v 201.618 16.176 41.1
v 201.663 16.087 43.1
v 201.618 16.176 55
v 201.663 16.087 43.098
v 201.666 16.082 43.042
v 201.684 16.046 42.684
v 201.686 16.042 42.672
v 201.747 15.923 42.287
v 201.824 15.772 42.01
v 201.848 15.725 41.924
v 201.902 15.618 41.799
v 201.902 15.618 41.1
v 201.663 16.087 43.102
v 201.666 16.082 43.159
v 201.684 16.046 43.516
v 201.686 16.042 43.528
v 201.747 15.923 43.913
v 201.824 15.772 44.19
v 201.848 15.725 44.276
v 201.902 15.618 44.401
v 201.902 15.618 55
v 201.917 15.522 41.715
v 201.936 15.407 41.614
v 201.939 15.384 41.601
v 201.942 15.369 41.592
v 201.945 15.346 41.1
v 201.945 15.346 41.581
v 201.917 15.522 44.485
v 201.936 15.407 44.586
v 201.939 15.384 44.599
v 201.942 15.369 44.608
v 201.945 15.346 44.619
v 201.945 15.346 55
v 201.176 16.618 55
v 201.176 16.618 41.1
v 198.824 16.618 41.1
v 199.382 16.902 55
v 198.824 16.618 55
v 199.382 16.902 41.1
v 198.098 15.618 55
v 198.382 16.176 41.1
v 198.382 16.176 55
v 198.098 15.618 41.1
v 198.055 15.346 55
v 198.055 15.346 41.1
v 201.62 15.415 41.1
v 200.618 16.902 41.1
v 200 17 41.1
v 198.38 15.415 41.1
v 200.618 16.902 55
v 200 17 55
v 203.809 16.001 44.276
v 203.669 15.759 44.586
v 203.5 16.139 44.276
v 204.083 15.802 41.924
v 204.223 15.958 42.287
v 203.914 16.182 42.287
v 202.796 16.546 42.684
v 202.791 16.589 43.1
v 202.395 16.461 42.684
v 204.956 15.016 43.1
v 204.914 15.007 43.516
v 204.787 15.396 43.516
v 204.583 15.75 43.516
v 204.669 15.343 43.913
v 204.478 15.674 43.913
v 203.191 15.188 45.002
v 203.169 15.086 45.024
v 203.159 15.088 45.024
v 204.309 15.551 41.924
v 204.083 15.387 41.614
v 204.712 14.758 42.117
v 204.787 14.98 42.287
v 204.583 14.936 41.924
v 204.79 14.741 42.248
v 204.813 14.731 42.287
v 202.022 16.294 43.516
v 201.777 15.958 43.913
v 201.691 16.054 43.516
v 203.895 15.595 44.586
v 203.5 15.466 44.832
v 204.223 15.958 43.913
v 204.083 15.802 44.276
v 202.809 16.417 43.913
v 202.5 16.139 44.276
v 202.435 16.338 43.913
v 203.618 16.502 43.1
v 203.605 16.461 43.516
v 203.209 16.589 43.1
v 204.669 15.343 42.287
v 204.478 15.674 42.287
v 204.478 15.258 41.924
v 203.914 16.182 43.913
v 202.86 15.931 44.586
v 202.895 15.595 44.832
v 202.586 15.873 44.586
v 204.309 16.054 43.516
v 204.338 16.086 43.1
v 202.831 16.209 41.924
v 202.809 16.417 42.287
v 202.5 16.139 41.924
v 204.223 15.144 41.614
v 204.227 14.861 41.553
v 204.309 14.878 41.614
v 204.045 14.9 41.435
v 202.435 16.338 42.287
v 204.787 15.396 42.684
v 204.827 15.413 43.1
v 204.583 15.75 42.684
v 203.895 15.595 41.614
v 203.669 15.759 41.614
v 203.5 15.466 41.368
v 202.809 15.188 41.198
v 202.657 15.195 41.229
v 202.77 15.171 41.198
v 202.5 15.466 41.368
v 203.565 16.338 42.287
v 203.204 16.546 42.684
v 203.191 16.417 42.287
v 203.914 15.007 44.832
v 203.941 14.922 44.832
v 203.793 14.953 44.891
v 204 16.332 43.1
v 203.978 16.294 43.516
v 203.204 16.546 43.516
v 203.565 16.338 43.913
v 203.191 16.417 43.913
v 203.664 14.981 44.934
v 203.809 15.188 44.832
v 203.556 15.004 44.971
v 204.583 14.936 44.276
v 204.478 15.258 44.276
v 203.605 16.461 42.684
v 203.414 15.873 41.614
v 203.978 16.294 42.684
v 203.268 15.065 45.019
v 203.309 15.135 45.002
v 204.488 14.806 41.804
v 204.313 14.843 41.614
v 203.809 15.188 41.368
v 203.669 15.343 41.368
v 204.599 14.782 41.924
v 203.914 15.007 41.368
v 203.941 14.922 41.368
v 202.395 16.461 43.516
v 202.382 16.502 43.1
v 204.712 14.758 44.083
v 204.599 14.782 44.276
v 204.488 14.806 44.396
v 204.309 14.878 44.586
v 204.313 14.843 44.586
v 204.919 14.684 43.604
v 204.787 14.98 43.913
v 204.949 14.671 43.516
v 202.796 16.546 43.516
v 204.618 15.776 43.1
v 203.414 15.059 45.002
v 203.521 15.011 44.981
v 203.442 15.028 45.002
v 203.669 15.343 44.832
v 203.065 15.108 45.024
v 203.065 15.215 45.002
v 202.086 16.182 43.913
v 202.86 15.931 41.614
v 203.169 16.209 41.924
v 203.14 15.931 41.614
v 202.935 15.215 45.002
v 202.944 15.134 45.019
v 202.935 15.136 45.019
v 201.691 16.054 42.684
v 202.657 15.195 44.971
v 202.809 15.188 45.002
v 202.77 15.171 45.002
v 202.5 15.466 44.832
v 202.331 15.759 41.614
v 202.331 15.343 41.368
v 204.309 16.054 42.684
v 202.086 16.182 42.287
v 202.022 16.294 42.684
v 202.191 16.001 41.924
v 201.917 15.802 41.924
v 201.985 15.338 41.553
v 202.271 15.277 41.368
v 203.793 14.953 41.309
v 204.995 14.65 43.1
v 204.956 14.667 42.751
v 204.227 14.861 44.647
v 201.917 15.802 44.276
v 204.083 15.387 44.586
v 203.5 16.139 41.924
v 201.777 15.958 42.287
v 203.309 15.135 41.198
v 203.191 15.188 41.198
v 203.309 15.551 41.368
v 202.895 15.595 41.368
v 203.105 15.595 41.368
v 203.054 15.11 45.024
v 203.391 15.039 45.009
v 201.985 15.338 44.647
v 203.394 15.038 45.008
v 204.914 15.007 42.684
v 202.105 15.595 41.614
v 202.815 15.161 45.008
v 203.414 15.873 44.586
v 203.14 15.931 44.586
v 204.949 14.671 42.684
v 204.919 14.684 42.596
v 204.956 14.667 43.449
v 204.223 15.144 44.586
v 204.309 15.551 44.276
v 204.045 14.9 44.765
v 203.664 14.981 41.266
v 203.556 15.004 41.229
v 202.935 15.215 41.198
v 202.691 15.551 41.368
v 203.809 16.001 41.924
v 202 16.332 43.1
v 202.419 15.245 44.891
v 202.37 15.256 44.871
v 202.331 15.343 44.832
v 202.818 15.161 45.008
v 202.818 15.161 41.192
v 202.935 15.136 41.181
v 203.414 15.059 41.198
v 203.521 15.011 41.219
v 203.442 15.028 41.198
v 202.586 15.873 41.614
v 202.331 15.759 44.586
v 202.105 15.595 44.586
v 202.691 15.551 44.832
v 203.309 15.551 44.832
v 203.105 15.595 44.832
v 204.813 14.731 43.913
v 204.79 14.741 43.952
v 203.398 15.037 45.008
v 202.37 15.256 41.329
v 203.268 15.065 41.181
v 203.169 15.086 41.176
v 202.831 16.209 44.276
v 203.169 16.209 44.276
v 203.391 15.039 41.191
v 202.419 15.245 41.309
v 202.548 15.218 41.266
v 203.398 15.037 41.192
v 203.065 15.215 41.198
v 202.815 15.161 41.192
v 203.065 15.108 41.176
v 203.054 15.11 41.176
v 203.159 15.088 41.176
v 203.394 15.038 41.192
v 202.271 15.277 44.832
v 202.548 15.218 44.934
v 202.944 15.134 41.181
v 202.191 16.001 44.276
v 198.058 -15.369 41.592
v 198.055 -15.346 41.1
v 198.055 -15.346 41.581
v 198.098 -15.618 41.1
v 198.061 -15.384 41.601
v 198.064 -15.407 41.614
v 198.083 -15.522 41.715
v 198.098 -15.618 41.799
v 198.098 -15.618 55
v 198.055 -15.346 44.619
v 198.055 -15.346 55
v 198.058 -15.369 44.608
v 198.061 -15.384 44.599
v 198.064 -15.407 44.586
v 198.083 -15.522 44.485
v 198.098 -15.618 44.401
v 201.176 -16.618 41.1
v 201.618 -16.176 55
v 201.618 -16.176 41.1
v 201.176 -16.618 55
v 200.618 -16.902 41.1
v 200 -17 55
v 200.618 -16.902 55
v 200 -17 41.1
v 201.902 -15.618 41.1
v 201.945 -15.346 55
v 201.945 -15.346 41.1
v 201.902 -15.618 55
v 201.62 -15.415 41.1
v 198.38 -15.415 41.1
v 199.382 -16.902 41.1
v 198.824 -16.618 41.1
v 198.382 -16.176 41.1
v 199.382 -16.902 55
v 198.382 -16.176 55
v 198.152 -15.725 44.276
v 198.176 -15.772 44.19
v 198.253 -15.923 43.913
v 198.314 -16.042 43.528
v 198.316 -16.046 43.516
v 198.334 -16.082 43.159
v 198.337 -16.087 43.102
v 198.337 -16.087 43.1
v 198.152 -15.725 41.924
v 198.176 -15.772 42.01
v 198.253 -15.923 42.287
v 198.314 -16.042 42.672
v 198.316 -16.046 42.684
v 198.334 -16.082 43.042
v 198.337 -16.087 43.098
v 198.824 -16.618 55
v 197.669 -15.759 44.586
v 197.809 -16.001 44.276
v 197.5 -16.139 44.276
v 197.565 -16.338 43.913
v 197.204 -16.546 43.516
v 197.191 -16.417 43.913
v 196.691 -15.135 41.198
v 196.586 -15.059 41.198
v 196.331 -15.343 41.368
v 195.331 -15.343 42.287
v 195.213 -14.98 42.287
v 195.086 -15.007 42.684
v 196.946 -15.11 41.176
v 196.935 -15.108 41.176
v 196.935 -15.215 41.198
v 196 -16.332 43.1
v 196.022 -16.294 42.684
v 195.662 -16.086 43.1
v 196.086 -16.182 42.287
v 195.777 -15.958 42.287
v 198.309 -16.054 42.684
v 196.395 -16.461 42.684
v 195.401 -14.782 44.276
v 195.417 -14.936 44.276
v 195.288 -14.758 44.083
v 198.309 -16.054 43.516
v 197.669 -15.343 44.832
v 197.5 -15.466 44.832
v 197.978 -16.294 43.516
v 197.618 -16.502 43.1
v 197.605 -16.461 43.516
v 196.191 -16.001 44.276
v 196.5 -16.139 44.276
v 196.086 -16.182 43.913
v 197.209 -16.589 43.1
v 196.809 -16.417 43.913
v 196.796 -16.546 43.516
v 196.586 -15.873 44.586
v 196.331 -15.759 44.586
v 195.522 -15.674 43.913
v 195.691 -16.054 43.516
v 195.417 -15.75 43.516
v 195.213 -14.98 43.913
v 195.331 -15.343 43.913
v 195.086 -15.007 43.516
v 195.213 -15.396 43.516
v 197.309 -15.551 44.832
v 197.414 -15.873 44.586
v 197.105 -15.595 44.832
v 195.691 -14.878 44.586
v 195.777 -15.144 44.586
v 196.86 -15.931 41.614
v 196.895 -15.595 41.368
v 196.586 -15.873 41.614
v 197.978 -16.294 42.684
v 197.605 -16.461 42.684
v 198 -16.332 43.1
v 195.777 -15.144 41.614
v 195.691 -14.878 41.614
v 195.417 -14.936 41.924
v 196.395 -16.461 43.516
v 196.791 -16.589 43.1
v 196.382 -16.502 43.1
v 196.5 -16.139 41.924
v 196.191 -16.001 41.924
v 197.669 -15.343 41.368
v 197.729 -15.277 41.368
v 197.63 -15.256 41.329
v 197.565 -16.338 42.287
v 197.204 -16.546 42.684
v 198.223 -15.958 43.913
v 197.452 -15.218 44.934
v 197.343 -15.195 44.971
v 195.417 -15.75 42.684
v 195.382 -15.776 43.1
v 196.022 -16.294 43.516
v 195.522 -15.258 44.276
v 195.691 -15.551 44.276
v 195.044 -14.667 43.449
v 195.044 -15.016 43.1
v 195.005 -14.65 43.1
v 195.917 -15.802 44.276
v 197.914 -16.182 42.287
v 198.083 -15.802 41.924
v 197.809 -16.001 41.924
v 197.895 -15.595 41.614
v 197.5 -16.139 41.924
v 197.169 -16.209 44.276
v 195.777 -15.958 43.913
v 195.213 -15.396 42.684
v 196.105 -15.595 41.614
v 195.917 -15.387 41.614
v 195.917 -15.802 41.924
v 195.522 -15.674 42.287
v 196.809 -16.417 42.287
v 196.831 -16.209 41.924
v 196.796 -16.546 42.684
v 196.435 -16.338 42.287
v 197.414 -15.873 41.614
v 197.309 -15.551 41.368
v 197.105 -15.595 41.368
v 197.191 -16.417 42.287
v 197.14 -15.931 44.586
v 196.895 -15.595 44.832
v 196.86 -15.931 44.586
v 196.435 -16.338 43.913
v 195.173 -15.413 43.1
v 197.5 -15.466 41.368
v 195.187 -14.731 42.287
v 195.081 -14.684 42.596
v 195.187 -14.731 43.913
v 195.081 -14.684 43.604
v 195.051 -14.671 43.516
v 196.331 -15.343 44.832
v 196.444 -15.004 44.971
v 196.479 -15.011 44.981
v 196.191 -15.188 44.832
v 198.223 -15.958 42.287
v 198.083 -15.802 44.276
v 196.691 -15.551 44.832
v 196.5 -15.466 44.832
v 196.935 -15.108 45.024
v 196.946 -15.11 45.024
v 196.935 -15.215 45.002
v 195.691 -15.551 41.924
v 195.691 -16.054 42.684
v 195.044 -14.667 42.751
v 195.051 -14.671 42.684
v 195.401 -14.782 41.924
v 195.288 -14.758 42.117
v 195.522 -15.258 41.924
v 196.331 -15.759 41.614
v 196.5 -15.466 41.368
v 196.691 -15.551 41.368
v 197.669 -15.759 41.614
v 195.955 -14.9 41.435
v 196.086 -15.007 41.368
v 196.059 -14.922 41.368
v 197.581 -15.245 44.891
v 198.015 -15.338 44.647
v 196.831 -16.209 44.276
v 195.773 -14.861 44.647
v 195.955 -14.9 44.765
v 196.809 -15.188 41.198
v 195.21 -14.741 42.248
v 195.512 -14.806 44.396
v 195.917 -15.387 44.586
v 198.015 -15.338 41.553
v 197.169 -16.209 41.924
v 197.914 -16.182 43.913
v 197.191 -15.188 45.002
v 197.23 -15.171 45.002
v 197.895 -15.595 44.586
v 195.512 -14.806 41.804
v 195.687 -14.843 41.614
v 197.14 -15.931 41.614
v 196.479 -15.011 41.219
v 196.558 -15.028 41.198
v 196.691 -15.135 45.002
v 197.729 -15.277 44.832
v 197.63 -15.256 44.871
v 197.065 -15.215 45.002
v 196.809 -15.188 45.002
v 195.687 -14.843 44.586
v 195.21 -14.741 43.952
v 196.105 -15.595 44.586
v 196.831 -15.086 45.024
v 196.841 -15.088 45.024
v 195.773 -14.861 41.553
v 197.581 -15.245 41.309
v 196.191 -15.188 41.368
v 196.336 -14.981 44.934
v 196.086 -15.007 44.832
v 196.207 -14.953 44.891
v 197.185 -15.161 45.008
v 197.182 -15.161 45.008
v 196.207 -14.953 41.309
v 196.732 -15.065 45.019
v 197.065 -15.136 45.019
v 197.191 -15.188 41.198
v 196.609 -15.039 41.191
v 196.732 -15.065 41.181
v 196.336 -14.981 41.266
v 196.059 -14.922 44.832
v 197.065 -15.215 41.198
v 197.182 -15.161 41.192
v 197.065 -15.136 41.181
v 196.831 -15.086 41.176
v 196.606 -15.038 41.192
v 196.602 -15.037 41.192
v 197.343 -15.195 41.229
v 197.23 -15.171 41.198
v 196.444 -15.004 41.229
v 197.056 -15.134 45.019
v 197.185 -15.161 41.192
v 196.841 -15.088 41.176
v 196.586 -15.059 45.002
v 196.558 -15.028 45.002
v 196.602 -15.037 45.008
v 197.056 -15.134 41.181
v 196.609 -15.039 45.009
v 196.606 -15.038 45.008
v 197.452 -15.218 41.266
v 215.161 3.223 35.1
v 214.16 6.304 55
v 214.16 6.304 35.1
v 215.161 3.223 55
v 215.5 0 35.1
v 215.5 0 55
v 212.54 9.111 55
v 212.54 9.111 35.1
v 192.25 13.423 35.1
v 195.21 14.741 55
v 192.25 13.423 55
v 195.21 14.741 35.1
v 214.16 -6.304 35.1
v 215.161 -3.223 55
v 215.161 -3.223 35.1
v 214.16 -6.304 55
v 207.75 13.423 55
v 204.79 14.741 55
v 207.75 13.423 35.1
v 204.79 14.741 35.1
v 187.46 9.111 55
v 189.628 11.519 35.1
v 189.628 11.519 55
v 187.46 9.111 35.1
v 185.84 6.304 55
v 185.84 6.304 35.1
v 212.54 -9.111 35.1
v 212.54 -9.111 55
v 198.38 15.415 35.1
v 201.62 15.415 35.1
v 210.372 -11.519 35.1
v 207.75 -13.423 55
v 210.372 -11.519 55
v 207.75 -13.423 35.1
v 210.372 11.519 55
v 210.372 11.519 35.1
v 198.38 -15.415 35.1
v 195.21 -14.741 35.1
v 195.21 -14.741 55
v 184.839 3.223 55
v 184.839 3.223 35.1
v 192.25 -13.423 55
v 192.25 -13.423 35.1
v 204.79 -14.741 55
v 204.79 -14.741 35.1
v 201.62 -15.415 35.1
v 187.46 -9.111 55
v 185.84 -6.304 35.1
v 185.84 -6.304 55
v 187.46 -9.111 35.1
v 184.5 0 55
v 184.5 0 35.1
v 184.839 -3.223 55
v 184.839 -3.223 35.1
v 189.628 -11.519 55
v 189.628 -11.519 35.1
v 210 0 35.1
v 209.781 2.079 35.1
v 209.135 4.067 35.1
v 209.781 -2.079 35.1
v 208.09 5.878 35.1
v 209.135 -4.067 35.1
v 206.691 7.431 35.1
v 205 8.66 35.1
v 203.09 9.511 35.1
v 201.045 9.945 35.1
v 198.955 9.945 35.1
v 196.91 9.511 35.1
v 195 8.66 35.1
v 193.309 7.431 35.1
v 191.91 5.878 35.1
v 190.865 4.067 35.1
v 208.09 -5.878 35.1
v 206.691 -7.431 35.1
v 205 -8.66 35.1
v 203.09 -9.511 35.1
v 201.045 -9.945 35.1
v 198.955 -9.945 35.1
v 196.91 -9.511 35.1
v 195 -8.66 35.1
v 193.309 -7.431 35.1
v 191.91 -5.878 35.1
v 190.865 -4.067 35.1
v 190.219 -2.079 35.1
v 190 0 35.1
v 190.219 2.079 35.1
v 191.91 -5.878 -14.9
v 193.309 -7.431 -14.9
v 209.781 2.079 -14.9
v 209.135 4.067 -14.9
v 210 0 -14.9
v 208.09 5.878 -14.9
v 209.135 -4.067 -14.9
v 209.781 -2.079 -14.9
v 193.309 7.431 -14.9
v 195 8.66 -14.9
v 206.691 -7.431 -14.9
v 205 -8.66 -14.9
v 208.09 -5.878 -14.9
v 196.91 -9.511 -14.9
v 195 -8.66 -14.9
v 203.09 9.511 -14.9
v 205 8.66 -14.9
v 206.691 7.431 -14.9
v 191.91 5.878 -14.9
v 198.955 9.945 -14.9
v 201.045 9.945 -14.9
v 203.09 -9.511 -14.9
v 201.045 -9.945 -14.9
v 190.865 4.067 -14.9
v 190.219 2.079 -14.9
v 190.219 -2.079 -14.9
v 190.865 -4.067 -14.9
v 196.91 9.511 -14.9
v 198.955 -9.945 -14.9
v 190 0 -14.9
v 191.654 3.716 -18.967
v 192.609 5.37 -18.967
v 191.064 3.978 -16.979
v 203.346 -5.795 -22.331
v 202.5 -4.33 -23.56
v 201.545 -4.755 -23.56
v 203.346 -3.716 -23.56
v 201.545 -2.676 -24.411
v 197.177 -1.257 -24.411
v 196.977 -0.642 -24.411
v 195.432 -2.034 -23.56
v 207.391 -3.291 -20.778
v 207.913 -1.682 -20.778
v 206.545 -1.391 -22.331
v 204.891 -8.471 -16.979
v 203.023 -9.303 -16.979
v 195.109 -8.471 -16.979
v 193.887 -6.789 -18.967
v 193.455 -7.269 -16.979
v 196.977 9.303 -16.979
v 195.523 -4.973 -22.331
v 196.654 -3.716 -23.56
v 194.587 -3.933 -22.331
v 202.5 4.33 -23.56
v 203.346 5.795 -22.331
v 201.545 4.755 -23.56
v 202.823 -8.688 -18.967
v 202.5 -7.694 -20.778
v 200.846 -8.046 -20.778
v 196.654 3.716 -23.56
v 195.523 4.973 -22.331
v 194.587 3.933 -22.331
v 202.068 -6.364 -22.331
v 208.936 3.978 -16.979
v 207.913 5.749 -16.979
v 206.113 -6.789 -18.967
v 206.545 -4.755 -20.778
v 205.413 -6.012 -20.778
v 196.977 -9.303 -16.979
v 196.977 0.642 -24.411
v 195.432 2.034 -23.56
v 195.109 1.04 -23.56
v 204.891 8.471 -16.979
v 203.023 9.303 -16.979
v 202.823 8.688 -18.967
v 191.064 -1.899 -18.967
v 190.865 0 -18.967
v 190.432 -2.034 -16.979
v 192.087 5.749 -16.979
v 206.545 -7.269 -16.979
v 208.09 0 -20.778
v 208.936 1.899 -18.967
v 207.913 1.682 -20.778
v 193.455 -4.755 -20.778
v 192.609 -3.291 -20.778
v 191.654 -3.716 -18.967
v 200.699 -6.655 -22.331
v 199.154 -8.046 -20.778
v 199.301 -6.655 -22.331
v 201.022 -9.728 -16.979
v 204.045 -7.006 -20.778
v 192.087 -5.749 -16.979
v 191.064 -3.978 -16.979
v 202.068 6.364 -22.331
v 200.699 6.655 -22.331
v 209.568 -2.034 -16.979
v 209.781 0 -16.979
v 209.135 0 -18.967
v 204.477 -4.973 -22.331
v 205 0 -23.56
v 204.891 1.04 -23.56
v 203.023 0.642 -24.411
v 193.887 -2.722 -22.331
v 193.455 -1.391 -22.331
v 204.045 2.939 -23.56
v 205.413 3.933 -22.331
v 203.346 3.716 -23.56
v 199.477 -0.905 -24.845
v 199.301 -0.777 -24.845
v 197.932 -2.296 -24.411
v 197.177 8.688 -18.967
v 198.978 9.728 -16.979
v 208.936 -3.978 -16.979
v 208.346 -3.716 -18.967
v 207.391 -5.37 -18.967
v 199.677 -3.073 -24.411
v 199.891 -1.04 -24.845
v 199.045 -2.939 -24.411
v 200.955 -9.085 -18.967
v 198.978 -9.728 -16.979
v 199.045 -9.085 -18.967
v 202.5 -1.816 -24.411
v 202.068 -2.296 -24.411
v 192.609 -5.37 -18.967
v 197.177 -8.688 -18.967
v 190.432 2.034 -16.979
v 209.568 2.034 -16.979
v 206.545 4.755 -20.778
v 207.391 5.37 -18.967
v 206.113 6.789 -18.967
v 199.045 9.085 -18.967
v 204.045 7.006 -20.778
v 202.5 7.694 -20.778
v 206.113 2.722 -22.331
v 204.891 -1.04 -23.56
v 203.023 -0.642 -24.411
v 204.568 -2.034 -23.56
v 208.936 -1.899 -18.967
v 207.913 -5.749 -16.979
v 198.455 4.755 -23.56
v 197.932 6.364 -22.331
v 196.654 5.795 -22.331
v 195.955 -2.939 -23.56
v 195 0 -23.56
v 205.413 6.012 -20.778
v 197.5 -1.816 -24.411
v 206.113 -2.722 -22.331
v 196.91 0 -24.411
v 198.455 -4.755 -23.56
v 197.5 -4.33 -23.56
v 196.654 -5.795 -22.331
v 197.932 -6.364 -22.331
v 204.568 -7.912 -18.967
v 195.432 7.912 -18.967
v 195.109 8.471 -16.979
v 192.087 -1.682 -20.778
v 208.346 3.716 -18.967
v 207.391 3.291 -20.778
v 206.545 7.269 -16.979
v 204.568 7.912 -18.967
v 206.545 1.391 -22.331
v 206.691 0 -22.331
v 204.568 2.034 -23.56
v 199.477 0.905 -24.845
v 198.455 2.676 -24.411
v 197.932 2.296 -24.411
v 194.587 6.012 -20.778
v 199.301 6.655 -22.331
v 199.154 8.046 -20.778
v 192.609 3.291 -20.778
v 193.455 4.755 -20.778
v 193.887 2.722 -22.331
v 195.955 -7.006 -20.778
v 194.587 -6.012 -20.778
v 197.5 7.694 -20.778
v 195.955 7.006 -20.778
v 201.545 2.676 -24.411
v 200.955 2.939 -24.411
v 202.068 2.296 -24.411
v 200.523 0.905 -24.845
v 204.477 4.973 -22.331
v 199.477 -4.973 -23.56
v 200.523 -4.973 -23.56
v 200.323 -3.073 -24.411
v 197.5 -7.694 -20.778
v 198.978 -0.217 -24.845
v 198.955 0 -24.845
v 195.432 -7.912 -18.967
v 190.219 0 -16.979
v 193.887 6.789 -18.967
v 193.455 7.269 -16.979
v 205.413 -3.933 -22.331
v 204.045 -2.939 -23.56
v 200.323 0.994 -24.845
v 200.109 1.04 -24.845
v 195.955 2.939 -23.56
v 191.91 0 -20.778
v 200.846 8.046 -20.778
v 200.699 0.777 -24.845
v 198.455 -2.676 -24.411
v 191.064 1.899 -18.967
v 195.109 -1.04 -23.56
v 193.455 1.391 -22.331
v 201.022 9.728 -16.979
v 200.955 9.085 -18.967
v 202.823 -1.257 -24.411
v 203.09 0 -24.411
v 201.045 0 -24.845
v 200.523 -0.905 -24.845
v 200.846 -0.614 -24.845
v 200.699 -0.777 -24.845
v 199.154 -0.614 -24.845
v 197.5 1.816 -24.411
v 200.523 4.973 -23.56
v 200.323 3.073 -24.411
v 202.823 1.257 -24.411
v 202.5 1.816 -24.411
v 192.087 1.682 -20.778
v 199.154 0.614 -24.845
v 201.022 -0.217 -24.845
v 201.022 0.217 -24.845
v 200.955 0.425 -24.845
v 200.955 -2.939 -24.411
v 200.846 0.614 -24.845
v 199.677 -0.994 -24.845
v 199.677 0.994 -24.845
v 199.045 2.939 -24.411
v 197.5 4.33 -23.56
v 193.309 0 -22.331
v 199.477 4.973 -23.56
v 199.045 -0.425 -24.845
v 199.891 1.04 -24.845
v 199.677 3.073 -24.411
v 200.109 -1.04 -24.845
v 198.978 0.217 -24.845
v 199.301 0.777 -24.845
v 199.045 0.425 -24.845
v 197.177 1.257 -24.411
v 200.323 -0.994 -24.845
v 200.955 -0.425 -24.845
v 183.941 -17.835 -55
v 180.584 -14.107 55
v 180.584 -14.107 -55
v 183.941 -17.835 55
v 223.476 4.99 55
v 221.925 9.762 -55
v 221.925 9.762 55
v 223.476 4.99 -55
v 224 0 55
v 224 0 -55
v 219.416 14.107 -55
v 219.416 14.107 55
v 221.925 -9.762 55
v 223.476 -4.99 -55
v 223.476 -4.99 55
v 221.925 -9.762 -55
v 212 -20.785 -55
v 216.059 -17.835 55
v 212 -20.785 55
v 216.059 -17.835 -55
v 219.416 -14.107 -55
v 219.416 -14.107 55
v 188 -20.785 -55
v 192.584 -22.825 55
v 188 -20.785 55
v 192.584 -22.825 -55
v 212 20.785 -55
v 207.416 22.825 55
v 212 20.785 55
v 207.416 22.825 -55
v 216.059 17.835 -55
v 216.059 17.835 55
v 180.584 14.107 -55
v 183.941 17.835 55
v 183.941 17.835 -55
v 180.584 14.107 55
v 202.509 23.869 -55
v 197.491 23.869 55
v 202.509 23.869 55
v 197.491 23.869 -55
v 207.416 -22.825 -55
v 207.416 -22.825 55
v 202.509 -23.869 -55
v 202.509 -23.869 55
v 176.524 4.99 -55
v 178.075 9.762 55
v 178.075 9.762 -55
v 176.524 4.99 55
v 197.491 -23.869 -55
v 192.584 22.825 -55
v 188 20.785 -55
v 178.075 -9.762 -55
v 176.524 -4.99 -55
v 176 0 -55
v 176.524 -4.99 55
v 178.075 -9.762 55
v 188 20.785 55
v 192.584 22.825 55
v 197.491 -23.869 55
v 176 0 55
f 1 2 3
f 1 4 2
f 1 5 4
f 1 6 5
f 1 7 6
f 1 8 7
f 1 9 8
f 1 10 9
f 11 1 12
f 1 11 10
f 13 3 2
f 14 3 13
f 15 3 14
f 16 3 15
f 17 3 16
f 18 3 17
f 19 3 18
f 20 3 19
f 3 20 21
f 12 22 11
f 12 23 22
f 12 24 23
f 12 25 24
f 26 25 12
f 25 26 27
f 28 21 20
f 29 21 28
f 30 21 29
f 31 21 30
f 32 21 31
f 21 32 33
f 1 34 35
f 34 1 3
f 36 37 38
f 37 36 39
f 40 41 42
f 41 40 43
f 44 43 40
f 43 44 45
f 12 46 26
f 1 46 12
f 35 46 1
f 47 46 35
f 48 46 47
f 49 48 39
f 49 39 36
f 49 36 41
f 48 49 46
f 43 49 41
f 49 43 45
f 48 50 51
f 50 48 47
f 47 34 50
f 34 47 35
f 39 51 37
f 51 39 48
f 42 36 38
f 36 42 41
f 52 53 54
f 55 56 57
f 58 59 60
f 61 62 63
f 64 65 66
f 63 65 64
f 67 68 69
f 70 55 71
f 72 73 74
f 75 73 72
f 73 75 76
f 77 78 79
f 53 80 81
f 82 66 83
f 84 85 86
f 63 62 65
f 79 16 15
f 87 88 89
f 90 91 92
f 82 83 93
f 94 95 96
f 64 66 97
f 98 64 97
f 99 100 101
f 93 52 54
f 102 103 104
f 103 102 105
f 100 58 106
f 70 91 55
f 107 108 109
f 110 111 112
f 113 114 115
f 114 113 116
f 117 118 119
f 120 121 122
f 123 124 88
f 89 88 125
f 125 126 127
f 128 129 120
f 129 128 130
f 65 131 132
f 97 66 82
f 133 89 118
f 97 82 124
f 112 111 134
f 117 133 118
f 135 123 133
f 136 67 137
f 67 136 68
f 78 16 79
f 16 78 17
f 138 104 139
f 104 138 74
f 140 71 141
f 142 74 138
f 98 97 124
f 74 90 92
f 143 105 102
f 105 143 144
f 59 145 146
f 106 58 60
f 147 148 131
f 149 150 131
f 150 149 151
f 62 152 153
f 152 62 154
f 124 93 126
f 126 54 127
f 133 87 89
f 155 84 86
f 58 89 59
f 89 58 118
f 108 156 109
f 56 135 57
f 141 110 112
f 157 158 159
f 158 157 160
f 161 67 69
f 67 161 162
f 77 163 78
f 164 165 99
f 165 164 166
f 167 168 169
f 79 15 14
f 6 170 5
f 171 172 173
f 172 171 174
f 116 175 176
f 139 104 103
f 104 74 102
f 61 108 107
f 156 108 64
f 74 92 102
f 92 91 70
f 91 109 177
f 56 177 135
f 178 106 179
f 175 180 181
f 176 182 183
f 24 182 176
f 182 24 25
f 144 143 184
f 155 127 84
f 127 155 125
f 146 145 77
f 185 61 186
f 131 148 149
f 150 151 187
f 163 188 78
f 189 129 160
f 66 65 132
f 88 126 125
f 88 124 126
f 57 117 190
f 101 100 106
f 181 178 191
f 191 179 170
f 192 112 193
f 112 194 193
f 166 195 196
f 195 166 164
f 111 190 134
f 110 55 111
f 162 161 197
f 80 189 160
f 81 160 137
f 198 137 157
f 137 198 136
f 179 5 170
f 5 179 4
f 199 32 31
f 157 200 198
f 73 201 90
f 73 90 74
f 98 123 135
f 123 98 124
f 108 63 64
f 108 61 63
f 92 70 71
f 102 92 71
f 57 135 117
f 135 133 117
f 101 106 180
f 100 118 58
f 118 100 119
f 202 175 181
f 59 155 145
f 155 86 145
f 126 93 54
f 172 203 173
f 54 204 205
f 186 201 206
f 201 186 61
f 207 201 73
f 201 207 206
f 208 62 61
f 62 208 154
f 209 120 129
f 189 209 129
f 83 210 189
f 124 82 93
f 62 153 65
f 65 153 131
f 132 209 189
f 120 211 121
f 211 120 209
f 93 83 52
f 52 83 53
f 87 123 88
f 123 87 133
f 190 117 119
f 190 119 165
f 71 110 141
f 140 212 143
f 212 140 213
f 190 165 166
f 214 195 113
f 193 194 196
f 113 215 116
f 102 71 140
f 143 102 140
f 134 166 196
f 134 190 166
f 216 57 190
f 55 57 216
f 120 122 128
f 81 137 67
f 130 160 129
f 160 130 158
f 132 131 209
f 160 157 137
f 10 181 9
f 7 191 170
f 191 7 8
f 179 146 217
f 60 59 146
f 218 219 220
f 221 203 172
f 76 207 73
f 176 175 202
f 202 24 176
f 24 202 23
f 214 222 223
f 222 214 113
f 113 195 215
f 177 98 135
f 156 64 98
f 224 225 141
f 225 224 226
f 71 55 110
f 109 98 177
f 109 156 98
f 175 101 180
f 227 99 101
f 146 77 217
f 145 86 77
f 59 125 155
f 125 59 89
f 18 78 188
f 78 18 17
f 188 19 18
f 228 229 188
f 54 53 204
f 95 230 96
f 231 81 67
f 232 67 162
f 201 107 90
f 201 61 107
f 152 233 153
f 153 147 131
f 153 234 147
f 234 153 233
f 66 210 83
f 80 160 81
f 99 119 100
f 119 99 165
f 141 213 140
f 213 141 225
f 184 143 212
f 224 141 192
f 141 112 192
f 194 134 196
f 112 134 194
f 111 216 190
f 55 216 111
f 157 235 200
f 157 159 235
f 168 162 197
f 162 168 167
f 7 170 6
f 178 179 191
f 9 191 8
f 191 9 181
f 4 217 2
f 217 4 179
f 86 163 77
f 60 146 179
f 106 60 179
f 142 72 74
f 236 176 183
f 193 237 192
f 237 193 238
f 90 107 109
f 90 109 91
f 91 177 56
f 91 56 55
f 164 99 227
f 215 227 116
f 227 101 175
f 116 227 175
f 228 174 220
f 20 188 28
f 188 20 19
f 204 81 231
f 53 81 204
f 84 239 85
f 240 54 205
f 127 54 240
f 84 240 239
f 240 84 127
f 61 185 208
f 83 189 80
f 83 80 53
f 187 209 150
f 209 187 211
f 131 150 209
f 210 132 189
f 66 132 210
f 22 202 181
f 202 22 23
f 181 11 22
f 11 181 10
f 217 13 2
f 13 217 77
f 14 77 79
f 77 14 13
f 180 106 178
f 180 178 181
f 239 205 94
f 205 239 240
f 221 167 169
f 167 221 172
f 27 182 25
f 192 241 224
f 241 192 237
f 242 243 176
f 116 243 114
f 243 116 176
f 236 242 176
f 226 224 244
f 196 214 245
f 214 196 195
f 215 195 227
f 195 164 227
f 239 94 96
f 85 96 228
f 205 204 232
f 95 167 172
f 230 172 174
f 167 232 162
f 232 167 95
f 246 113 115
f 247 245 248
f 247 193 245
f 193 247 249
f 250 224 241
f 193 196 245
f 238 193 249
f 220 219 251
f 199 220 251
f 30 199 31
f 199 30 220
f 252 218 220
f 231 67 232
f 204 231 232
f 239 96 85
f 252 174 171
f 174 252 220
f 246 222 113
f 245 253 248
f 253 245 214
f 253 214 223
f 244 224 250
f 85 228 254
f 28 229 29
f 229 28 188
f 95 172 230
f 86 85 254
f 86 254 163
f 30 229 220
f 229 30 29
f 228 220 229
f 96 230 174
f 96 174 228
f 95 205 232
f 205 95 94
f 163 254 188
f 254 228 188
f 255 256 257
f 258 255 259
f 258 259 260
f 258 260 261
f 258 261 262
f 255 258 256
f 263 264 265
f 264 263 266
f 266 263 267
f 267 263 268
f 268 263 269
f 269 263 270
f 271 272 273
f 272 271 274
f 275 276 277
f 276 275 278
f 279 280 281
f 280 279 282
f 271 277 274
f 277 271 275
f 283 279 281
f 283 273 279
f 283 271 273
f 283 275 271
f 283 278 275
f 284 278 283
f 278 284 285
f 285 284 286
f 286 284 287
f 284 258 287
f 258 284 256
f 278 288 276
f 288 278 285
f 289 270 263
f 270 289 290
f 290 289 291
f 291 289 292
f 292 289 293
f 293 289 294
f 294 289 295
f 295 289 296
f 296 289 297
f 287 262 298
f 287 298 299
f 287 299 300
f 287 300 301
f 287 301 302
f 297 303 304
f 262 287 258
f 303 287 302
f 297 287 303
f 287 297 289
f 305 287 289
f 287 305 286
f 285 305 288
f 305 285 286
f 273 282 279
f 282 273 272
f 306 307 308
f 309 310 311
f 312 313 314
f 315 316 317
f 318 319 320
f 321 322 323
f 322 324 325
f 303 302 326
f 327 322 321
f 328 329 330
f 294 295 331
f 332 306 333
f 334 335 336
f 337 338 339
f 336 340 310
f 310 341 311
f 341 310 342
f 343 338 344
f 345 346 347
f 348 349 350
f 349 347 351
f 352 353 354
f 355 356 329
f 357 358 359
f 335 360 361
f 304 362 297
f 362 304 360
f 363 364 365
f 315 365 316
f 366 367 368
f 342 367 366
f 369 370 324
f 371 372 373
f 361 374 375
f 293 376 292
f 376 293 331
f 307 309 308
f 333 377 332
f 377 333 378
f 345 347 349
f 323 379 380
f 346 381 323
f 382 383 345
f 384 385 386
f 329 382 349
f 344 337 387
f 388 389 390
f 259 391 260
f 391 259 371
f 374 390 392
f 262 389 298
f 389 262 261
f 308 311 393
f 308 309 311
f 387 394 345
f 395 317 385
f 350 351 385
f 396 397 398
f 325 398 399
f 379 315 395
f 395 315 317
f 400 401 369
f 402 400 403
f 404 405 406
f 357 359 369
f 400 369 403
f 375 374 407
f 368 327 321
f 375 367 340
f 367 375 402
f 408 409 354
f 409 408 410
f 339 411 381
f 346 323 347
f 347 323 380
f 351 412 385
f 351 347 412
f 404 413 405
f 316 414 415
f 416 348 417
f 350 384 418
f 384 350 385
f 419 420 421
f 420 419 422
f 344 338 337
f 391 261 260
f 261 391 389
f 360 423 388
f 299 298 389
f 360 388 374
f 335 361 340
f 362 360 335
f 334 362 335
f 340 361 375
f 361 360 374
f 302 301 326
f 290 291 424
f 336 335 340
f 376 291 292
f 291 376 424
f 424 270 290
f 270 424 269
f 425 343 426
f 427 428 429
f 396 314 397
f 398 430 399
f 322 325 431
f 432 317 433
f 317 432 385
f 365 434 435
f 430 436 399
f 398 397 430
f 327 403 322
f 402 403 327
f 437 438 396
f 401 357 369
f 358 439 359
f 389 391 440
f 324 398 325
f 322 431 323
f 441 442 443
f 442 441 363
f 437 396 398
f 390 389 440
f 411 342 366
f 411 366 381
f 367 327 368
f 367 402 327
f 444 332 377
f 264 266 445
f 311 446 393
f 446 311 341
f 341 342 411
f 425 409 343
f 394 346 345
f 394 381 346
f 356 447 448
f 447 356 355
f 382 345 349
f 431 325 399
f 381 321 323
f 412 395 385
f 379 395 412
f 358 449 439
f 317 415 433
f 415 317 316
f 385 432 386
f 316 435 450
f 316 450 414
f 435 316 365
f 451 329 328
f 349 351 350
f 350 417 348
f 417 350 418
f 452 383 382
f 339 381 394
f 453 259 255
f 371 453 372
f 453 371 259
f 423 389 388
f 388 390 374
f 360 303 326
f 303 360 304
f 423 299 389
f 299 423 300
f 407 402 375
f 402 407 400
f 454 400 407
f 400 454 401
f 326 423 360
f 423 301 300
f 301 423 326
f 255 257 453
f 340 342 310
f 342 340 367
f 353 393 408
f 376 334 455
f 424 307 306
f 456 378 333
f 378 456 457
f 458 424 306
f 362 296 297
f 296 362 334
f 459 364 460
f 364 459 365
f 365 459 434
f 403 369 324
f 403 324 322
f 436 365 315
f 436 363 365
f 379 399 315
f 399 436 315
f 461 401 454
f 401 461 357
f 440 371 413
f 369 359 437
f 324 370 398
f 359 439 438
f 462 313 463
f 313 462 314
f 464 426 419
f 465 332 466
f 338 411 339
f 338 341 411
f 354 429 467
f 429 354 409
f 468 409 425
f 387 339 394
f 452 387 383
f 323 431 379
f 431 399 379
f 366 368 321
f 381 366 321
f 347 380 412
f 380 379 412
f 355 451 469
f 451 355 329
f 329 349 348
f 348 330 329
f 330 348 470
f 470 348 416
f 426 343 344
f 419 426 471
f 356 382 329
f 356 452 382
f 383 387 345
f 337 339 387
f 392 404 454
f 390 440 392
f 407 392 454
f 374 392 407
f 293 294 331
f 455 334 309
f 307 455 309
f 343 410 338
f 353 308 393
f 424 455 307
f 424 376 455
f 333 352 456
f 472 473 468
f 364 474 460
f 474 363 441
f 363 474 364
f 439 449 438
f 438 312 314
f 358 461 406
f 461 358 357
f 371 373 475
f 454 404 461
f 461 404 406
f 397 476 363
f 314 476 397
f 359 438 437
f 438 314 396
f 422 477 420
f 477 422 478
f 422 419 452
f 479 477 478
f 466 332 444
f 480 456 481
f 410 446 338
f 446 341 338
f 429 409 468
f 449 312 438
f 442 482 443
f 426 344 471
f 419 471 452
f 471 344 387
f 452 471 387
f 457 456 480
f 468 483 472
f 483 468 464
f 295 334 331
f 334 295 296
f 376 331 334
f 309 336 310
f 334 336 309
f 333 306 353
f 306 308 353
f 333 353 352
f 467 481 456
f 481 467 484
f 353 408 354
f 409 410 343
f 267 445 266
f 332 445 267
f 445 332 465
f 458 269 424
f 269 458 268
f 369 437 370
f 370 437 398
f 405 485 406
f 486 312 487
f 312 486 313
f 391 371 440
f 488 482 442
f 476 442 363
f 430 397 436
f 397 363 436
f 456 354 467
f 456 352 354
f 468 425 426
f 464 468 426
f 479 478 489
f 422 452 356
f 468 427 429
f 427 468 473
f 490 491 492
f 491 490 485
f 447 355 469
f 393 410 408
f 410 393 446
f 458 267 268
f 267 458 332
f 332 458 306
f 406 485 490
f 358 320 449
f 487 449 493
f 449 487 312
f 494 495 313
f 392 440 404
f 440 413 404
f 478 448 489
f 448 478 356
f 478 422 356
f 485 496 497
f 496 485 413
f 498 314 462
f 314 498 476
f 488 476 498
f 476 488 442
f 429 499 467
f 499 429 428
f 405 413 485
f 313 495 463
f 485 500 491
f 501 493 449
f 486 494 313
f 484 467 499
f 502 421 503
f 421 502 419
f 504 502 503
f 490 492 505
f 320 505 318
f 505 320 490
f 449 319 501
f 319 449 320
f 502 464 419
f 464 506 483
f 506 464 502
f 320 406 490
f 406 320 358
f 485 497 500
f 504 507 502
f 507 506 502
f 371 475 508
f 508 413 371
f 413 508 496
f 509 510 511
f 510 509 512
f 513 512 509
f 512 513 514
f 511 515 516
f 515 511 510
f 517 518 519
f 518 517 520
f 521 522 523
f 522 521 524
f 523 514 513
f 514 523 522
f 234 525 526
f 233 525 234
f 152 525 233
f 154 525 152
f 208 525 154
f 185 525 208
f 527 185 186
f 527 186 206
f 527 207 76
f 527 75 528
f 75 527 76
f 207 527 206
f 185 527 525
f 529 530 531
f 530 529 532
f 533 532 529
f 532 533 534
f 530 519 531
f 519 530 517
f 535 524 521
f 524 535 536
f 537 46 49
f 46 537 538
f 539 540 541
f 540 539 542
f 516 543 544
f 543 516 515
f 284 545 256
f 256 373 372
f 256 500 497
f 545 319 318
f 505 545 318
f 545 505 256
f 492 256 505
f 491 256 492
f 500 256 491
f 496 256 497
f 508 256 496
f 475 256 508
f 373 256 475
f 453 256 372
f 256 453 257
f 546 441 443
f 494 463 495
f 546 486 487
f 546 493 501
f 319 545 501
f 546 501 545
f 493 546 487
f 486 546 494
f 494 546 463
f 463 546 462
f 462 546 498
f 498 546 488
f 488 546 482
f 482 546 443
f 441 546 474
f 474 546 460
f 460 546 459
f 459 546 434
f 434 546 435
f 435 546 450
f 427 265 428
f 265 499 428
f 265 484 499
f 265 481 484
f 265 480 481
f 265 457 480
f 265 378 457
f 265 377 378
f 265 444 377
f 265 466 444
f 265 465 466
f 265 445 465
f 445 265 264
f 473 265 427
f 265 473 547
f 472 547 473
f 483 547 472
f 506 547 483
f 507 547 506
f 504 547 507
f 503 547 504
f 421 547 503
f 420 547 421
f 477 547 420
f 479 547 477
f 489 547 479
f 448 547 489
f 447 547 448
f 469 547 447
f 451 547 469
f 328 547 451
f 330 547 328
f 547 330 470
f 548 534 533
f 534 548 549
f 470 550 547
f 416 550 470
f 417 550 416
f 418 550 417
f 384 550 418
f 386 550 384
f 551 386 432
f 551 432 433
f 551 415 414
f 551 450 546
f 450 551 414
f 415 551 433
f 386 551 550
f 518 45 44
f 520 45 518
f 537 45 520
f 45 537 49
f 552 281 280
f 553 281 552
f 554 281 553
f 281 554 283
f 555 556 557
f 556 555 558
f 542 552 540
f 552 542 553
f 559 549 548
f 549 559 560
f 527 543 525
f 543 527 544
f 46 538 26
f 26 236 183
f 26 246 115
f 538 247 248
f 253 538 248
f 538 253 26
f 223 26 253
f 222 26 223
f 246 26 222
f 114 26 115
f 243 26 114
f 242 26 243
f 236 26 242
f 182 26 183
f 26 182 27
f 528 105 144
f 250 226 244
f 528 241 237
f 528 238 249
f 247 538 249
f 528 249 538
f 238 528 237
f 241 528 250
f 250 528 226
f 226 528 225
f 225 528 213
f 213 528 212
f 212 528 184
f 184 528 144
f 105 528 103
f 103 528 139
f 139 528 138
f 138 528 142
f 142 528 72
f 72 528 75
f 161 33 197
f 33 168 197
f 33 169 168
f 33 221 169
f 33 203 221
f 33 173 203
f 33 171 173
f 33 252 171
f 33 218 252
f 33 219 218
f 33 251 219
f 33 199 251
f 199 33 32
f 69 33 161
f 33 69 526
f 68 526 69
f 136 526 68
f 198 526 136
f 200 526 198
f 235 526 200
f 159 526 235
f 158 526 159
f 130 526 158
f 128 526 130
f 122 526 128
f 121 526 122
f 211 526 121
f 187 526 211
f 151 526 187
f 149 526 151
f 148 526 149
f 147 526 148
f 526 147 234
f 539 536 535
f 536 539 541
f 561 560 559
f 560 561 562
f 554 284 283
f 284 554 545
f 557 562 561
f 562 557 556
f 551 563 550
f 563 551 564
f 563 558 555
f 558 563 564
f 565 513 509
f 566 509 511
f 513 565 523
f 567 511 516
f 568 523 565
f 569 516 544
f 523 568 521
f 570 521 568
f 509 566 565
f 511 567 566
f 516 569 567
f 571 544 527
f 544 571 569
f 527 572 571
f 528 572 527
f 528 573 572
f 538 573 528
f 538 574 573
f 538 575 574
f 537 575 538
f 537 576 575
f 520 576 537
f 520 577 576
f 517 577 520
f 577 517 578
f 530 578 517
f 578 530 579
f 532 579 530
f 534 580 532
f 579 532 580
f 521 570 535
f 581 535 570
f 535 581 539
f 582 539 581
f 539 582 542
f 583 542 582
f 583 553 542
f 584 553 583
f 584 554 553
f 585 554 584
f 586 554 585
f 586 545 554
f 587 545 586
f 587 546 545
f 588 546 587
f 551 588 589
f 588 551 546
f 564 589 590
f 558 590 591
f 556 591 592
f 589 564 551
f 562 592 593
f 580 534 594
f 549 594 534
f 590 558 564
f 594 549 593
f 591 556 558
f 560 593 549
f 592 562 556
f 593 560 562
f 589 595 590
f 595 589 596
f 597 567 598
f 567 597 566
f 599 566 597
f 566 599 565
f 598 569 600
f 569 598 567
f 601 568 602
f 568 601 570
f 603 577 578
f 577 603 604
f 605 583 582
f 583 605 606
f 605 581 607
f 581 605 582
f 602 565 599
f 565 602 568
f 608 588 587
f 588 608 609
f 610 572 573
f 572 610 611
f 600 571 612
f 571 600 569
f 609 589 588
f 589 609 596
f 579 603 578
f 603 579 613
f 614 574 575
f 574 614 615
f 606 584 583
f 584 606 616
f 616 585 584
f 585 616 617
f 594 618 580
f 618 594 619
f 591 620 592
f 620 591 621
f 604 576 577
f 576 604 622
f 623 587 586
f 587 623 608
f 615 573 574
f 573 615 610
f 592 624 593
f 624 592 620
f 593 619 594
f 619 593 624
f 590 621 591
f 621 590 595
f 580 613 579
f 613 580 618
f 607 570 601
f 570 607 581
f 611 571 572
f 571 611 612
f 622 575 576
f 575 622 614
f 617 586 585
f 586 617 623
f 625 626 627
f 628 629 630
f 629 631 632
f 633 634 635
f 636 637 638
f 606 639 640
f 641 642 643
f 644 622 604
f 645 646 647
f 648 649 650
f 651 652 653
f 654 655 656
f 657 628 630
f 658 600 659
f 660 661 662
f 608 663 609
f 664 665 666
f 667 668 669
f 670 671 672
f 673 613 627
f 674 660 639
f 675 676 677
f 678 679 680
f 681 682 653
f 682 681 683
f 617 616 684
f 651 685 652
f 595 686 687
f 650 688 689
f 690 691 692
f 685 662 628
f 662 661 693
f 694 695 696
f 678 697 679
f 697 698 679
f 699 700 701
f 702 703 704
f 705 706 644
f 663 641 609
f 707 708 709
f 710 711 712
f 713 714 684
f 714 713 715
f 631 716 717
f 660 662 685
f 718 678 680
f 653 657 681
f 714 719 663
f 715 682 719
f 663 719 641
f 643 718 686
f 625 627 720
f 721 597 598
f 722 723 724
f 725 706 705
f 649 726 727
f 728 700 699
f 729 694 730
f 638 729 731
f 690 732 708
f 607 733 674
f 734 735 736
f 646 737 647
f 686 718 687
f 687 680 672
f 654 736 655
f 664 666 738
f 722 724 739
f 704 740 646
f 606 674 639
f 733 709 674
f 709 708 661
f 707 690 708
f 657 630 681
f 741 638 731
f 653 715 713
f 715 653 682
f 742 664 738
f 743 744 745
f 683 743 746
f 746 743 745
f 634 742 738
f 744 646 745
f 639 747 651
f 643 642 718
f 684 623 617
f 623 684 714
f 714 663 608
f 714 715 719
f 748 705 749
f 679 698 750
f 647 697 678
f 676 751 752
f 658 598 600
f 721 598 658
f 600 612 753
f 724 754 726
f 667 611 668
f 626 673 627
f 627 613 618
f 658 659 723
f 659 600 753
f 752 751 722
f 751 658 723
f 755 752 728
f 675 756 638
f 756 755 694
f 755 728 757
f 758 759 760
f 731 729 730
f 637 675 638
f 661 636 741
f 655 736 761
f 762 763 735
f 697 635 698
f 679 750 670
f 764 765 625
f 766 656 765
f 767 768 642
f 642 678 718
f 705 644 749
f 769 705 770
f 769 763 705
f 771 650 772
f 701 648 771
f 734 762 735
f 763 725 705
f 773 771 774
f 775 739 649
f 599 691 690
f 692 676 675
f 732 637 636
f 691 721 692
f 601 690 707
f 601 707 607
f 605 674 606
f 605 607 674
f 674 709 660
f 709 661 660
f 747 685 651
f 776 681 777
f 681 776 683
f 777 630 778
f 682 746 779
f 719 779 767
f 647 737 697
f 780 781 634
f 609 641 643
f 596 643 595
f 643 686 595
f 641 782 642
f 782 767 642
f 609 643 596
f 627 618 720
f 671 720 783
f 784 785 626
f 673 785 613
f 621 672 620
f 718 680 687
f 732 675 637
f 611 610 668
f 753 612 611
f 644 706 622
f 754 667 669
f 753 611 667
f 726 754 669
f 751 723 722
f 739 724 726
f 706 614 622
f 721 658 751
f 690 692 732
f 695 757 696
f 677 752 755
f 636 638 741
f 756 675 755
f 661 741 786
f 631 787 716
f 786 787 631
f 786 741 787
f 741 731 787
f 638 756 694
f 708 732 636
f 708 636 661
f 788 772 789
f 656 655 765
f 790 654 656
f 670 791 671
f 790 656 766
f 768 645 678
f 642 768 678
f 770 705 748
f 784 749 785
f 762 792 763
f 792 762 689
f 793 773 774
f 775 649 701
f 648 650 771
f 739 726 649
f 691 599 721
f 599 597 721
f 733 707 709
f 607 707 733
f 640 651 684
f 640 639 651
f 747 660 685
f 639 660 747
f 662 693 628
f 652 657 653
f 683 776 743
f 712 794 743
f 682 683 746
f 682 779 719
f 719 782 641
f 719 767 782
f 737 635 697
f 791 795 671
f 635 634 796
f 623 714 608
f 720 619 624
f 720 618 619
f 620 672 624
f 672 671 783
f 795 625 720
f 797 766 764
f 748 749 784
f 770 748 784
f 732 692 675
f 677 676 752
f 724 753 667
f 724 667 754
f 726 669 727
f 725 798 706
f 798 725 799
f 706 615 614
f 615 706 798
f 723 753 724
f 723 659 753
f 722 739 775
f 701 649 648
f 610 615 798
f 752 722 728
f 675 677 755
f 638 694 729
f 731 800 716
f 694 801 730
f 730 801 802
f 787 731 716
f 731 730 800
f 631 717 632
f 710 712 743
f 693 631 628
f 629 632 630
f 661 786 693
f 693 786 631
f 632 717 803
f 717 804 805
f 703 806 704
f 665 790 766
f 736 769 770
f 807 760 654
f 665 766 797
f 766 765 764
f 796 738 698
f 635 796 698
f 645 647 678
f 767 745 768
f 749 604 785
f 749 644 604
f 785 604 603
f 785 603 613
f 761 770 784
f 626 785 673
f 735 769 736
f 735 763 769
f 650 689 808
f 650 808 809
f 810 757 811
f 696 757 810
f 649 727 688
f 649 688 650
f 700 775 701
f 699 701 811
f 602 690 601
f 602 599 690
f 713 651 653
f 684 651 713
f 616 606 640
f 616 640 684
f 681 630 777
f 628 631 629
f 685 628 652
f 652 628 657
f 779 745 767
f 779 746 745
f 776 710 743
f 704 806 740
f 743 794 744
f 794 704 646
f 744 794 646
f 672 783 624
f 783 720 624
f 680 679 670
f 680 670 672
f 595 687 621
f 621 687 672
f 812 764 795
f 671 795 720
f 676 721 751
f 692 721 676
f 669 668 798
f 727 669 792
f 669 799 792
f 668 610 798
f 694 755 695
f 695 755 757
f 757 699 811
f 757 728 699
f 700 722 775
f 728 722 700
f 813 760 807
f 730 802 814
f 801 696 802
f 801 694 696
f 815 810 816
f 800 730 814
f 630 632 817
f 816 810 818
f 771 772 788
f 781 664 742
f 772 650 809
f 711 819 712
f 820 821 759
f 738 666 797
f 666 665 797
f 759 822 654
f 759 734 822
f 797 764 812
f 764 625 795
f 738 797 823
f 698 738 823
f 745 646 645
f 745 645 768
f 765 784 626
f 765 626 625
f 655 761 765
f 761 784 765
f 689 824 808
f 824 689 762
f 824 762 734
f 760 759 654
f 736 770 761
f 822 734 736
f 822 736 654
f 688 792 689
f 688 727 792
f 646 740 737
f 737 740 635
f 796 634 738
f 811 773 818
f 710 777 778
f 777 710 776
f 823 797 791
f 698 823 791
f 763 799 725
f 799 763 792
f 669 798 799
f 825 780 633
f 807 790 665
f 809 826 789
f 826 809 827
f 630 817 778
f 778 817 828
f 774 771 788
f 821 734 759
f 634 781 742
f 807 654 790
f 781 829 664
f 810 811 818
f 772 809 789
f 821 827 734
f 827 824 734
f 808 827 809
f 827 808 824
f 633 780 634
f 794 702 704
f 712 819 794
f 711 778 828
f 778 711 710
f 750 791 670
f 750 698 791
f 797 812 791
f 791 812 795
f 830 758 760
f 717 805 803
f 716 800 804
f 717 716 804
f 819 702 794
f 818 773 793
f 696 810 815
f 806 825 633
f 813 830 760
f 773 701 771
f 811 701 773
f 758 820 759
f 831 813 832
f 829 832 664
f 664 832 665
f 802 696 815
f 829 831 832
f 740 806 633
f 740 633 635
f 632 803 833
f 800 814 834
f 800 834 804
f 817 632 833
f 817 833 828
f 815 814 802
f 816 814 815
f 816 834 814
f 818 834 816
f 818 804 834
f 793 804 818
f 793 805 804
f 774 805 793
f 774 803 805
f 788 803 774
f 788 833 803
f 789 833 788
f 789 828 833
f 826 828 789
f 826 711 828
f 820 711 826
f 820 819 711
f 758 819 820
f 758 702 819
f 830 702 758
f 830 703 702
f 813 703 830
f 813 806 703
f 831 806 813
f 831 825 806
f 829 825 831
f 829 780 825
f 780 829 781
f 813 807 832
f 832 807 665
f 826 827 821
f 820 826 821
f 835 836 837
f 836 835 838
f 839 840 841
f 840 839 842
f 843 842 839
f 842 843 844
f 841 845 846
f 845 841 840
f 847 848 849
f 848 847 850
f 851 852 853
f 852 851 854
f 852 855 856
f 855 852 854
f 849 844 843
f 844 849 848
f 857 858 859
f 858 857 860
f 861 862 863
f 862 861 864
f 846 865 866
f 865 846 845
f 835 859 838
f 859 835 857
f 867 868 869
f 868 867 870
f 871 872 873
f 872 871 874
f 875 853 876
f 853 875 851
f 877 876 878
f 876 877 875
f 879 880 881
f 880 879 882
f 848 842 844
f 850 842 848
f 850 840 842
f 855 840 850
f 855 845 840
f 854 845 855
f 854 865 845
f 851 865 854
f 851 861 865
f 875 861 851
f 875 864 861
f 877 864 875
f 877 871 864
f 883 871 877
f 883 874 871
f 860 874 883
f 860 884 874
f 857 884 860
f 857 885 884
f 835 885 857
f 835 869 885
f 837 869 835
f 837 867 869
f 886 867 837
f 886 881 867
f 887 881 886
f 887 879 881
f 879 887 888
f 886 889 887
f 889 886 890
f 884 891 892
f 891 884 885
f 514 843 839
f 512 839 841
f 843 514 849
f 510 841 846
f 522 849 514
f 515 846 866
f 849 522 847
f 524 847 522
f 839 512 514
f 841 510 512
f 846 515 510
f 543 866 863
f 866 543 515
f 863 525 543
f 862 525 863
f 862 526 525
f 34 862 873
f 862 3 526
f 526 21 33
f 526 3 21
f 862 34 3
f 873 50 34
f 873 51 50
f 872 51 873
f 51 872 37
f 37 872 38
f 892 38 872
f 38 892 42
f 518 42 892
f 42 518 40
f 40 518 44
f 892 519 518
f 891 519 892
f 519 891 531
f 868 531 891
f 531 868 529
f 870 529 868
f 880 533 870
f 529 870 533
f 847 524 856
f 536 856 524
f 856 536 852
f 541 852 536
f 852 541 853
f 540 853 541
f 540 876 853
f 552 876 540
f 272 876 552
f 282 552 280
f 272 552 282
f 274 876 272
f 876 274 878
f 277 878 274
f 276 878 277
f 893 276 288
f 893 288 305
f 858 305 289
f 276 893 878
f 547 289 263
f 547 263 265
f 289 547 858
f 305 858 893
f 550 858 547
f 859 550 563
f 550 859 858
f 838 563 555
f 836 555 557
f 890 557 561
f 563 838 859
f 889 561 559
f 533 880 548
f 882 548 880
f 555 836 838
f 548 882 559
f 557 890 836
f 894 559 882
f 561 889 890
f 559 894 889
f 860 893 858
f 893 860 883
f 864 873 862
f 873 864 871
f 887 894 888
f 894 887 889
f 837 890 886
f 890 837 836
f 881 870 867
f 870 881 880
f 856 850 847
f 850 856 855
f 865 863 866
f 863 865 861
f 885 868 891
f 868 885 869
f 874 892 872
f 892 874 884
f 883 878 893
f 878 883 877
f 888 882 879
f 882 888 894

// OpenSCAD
// general
bullet_holder_diameter = 30;
bullet_holder_height = 40;
receptacle_diameter = 20;
receptacle_depth = 70;
rod_diameter = 10;

// calibers
// 9mm
body_diameter_9mm = 9;
grove_diameter_9mm = 8.68;
// 357 mag
body_diameter_357mag = 9;
rim_diameter_357mag = 11;

// body structure
translate([200, 0, 0]) {
	union() {
		difference() {
			cylinder(d=bullet_holder_diameter+18, h=110, center=true);
			union(){
				translate([0, 0, 45.1]) {
					//bullet holder socket
					cylinder(d=bullet_holder_diameter+1, h=bullet_holder_height/2, center=true);

					// bullet and powder receptacle
					translate([0, 0, -25]) {
						cylinder(d=receptacle_diameter, h=receptacle_depth, center=true);;
					}
					translate([0, 0, -60]) {
						sphere(d=receptacle_diameter);
					}

					//locking grove
					translate([0, 15, 3]) {
						cylinder(d=4, h=14, center=true, $fn=20);
						translate([3, -.4, -5]) {
							sphere(d=4, $fn=30);
						}
					}
					translate([0, -15, 3]) {
						cylinder(d=4, h=14, center=true, $fn=20);
						translate([-3, .4, -5]) {
							sphere(d=4, $fn=30);
						}
					}
				}
			}
		}
	}
}

//body to handle rod linkage
// can't seem to figure out how to make a valid trapezoid
/* translate([-20, 0, 40]) {
	rotate([-90,0,0]){
		polyhedron(
			points=[
				[0,0,0],
				[40,0,0],
				[40,80,0],
				[0,80,0],
				[5,70,20],
				[5,10,20],
				[35,10,20],
				[35,70,20]
			],
			faces=[
				[0,1,2,3],
				[1,2,7,6],
				[2,3,4,7],
				[3,0,5,4],
				[4,5,6,7],
				[0,1,6,5],
			]
		);
	}
}
translate([0, 10, 0]) {
	rotate([-90,0,0]){
		cylinder(d=rod_diameter, h=rod_diameter*2, center=true);
	}
} */
